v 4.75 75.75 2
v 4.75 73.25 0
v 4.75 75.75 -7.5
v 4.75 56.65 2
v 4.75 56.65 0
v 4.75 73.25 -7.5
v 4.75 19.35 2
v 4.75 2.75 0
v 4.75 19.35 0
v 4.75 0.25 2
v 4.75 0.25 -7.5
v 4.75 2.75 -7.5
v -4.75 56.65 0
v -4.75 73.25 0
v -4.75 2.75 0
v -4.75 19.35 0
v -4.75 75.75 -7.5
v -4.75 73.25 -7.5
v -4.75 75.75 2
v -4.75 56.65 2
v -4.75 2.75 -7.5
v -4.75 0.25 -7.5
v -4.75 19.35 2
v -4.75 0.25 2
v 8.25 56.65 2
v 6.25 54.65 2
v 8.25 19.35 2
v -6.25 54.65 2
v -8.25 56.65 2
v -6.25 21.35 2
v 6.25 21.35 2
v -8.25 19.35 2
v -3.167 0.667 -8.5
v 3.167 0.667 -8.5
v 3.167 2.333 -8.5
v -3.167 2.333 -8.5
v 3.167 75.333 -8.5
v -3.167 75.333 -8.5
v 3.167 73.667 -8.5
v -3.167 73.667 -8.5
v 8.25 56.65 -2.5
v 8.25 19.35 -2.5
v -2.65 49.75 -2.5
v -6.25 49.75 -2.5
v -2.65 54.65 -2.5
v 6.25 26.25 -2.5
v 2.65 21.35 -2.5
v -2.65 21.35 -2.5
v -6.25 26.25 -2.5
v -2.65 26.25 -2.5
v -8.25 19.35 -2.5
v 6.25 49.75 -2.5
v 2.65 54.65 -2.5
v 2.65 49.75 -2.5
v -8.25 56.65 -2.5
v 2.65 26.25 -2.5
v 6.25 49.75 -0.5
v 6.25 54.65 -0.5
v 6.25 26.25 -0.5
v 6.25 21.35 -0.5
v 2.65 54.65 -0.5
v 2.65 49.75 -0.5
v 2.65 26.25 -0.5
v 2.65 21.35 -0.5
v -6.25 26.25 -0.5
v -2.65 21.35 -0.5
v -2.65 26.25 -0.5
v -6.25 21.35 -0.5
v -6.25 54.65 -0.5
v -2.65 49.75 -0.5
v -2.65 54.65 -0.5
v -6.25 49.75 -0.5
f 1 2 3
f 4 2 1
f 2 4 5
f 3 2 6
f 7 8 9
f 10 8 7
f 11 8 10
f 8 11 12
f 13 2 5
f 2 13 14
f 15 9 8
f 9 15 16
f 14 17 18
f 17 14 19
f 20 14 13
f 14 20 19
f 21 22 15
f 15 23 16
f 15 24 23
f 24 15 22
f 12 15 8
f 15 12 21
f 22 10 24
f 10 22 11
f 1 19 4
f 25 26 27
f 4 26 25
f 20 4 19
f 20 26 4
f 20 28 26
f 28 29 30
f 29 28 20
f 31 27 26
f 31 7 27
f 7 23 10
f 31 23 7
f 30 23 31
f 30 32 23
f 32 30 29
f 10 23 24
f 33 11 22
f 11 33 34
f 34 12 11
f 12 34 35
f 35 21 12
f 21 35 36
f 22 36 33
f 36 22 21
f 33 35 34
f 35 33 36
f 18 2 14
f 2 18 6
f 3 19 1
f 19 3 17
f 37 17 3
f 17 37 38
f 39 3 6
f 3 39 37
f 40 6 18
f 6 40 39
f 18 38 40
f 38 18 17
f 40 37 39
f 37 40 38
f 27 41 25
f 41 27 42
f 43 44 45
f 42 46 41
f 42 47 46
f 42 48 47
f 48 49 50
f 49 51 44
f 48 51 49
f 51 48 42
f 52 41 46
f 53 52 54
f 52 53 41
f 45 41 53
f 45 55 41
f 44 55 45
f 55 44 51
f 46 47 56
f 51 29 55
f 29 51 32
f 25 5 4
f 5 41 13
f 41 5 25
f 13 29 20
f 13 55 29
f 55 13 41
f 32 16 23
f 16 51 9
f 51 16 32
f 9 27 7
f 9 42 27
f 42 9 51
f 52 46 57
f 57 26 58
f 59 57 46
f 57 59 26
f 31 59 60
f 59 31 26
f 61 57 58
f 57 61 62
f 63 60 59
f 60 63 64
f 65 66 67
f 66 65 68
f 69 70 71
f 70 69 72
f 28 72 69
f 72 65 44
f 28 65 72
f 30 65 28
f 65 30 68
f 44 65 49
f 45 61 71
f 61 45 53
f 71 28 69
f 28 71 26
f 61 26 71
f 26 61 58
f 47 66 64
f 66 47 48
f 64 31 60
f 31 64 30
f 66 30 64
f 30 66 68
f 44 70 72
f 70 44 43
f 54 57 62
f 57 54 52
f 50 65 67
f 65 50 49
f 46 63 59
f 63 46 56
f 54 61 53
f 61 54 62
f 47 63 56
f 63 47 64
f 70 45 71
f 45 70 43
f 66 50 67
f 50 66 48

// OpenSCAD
// file: addon_support.scad
iw = 10;  // inner width
it = 3;   // inner thickness
h = 5;    // height
wt = 2;   // wall thickness
m = 0.25; // margin

module addon_holder() {
    module reinforcement() {
        rotate(90, [0, 0, 1])
        rotate(90, [1, 0, 0])
        linear_extrude(height=wt)
        polygon([
            [0, 0],
            [it+wt, 0],
            [0, -h]
        ]);
    }
    
    color("yellow") translate([-wt-iw/2, 0, -h]) {
        difference() {
            cube([iw+2*wt, it+wt, h]);
            translate([wt, -1, -1]) cube([iw, it+1, h+2]);
        }
        reinforcement();
        translate([iw+wt, 0, 0]) reinforcement();
    }
}

module addon_clip() {
    ch = 1.5*h;
    
    color("#fcc705") {
        translate([-(iw-2*m)/2, m, -ch])
        cube([iw-2*m, it-2*m, ch]);
        
        translate([-(iw-2*m)/2, m, 0])
        cube([iw-2*m, it+wt-m, wt]);
    
        translate([0, (it-2*m)/2+m, -ch-1])
        resize([iw-2*m, it-2*m, 1])
        rotate(45, [0, 0, 1])
        cylinder(h=1, r1=it/3, r2=it/2, $fn=4);
    }
}

module addon_bar(width) {
    addon_clip();
    translate([0, width, 0]) mirror([0, 1, 0]) addon_clip();
    
    color("orange")
    translate([-(iw-2*m)/2, it+wt, 0])
    cube([iw-2*m, width-2*(it+wt), wt]);
}

addon_holder();
addon_bar(20);
// main file
bw = 80;  // base width
wt = 2;   // wall thickness

sw = 12;  // servo width
sl = 23;  // servo length

hl = 32.8; // servo holder length
ht = 2.5;  // servo holder thickness
cw = 4.8;  // cord width

m = 0.25; // margin

use <addon_support.scad>

module addon_bar_servo() {
    w = bw-2*wt;
    
    difference() {
        union() {
            addon_bar(w);
            color("orange") translate([0, w/2, wt/2-ht/2]) cube([sw+2*m+2*wt, hl+2*m+2*wt, wt+ht], center=true);
        }
    
        // top large hole
        color("orange") translate([0, w/2, wt]) cube([sw+2*m, hl+2*m, 2*ht], center=true);
        // bottom smaller hole
        color("orange") translate([0, w/2, -wt]) cube([sw+2*m, sl+2*m, 2*wt], center=true);
        // cord hole
        color("orange") translate([0, w/2, -wt]) cube([cw+2*m, hl+2*m, 2*wt], center=true);
    }
}

addon_bar_servo();
